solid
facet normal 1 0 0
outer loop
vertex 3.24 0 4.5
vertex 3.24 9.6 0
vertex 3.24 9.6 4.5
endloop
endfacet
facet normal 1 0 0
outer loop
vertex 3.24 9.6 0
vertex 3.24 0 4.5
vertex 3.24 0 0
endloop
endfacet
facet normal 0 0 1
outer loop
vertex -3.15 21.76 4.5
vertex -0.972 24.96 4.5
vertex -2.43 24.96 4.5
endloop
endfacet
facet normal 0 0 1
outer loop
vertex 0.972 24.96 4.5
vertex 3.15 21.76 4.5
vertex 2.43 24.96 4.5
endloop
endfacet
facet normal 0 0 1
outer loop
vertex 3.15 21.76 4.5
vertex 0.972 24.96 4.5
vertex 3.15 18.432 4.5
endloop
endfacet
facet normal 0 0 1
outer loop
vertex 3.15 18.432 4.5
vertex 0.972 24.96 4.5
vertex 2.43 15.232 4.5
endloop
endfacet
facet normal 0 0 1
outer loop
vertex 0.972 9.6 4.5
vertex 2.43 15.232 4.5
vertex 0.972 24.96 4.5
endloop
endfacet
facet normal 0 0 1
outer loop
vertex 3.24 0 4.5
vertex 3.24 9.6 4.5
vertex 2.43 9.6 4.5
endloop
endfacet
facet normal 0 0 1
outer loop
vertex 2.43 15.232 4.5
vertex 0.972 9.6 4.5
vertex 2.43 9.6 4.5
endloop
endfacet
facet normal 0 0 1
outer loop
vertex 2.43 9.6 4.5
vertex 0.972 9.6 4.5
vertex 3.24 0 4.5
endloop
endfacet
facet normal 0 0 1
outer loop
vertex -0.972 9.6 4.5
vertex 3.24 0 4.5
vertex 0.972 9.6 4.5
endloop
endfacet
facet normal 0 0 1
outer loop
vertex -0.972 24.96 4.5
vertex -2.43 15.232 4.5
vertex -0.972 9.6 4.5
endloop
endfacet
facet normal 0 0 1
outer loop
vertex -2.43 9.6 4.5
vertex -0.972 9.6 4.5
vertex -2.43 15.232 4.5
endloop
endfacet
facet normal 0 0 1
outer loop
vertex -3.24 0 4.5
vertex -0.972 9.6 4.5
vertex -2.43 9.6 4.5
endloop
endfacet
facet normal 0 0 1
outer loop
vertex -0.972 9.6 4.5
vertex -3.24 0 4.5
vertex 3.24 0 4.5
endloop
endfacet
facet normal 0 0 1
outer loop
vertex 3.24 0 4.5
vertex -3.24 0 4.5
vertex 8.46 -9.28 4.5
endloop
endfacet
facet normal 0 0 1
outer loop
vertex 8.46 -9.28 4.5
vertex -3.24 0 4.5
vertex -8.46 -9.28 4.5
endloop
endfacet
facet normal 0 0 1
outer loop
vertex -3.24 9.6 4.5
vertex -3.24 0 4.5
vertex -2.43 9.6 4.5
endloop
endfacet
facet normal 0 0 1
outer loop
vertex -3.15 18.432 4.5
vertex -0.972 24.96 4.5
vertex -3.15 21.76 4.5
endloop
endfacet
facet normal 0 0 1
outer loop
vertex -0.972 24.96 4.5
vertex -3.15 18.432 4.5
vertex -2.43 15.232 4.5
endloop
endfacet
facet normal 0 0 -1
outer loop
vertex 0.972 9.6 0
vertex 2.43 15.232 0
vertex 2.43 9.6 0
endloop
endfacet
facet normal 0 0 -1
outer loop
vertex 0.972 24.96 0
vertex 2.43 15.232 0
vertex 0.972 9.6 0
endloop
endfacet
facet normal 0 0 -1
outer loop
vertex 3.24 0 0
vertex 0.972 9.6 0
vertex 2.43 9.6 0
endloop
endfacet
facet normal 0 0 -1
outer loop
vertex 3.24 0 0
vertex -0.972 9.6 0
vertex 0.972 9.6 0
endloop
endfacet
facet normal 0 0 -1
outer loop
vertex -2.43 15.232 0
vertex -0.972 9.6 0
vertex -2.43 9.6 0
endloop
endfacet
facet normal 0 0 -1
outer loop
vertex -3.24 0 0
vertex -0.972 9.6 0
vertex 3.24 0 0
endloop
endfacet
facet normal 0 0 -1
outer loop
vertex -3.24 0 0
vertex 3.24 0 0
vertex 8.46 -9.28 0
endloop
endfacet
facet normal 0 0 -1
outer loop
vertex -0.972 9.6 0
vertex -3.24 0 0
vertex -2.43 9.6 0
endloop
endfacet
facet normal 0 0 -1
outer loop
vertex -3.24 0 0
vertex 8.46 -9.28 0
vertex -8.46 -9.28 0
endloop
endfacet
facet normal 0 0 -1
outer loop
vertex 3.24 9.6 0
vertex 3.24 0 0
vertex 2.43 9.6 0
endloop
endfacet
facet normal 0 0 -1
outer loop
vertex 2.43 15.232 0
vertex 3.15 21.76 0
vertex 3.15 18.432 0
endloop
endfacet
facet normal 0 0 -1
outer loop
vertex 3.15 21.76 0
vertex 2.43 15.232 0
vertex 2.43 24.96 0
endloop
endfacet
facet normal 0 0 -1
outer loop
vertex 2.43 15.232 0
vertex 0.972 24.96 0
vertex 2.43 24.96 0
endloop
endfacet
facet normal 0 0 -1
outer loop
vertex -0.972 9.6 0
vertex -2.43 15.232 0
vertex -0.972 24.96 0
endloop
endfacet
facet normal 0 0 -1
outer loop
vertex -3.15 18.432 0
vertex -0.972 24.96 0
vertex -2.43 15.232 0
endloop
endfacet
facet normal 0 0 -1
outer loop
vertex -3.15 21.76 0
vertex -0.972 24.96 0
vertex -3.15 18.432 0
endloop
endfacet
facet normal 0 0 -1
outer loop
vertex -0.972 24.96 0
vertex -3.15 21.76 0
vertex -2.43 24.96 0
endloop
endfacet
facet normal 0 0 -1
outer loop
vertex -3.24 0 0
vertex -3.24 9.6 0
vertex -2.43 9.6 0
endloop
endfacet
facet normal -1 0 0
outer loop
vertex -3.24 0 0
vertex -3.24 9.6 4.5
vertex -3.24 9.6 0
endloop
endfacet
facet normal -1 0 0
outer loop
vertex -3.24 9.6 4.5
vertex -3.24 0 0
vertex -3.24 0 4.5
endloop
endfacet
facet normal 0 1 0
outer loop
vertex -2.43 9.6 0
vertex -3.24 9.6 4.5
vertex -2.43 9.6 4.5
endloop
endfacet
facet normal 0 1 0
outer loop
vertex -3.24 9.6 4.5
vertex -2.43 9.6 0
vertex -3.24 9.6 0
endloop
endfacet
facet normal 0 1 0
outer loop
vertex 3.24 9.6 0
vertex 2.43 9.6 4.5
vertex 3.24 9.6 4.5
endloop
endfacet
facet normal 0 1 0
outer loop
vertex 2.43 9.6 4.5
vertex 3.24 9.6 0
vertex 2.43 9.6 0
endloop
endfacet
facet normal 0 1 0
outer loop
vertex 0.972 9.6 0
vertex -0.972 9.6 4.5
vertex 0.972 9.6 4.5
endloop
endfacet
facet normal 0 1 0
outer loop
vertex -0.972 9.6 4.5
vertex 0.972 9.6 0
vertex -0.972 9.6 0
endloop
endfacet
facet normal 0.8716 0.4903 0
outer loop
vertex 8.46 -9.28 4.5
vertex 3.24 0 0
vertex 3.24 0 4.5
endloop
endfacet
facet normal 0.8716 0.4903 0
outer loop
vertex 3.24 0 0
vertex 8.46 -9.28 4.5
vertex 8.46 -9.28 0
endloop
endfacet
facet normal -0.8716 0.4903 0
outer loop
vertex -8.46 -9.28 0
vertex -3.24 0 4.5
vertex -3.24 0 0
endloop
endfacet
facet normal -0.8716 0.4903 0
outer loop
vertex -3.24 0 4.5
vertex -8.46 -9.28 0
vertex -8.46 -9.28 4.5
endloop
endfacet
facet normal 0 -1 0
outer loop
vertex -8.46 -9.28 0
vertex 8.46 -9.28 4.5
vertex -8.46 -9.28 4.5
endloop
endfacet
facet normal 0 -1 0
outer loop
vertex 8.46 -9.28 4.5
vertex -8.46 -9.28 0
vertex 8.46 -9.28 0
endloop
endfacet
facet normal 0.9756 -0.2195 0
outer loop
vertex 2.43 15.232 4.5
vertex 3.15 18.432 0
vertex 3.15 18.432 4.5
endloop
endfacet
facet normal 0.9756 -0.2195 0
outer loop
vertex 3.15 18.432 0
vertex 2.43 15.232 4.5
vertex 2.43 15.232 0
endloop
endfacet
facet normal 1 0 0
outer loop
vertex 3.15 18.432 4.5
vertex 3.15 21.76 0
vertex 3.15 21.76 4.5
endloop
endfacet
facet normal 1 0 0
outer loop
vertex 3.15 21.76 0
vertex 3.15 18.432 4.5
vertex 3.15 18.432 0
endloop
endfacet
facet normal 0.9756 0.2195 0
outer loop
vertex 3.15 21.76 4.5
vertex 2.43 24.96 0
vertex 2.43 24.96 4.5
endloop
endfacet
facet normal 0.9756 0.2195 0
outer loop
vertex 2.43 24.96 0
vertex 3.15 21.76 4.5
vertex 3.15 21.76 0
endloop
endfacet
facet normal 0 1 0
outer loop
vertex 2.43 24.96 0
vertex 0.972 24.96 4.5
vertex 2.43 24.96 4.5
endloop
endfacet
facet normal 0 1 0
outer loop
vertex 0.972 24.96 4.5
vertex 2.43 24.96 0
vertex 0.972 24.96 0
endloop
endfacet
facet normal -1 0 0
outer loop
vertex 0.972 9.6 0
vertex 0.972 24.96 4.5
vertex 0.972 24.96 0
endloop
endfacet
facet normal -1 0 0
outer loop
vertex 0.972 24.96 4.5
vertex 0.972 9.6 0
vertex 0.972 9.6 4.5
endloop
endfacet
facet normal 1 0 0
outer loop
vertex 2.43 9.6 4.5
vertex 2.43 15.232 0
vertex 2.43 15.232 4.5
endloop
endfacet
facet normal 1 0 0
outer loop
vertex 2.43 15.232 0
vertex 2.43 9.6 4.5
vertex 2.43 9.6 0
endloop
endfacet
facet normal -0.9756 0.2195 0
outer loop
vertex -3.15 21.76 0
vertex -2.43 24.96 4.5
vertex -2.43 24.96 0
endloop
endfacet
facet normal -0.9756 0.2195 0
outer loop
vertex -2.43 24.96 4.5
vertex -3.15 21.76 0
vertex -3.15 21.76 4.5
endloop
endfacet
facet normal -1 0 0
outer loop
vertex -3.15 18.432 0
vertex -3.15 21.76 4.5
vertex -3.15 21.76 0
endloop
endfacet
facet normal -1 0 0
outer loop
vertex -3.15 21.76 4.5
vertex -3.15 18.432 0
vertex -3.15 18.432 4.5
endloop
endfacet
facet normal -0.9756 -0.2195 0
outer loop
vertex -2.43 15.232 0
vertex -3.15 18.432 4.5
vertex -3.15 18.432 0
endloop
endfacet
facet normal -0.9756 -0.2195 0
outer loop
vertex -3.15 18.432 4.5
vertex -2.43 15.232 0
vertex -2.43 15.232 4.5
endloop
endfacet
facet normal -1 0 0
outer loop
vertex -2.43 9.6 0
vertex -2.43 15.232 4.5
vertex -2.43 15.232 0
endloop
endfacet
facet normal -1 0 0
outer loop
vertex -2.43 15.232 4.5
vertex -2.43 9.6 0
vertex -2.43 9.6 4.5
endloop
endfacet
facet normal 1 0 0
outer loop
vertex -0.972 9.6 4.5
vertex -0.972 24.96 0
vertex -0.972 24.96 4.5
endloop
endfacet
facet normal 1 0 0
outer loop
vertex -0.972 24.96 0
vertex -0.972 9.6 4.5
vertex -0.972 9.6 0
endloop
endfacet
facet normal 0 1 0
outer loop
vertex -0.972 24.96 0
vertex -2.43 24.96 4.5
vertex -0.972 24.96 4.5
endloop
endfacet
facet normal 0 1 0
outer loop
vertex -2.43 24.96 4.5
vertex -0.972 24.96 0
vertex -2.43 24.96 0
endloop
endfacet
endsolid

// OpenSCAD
$fn = 100;

// standard board thicknesses (mm)
PCB_THICK_06 = 0.6;
PCB_THICK_08 = 0.8;
PCB_THICK_10 = 1.0;
PCB_THICK_12 = 1.2;
PCB_THICK_16 = 1.6;

// standard board hole diameters
PCB_HOLE_30 = 3.0;

HEIGHT = 1.8;

// standard stand-off heights
STANDOFF_4 = 3.0;

// base dimensions
BASE_THICKNESS = 3.0;
BASE_DIAMETER = 12.0;
  
module pcb_support(coord,hole_dia,pcb_thick,standoff_height)
{
  translate(coord)
  {
    standoff(hole_dia,standoff_height);
    translate([standoff_height,0,0]) clip(hole_dia,pcb_thick,standoff_height);
  }
}

module baseWedge(hole_dia,base_thickness)
{
  standoff_side = hole_dia*1.2;              // width of standoff
  //standoff_thickness = hole_dia * .75;     // thickness of standoff bar
    standoff_thickness = HEIGHT;     // thickness of standoff bar
  
  translate([0,-base_thickness,0])
    linear_extrude(height=standoff_thickness)
    {
      polygon
      (
        points=
        [
          [-(standoff_side/2+base_thickness),0],
          [-standoff_side/2,base_thickness],
          [standoff_side/2,base_thickness],
          [standoff_side/2+base_thickness,0]
        ]
      );
    }
}

module standoff(hole_dia,height,base_thickness)
{
  standoff_side = hole_dia*1.2;             // width of standoff
  //standoff_thickness = hole_dia * .75;      // thickness of standoff bar
  standoff_thickness = HEIGHT;      // thickness of standoff bar
  shaft_width = hole_dia * 1.0;       // width of clip part that rests inside of the PCB hole
  slot_length = height/5-2;                   // length of cut slot
  slot_width = shaft_width * 0.4;           // amount of gap in the slot
  base_inset = 0.1;                         // inset of wedge into bottom of base
    
  // standoff
  translate([-standoff_side/2,0,0])
  {
    difference()
    {
      cube([standoff_side,height,standoff_thickness]);
      translate([standoff_side/2-slot_width/2,height-slot_length,0]) cube([slot_width,slot_length,standoff_thickness]);
    }
  }
  
  difference()
  {
    baseWedge(hole_dia,base_thickness);
    translate([-(standoff_side+base_thickness*2)/2,-base_thickness,0]) cube([standoff_side+base_thickness*2,base_inset,standoff_thickness]);
  }
}

//pcb_support([0,0,0],3,PCB_THICK_16,8);
module clip(hole_dia,pcb_thick)
{
clip_length = pcb_thick * 3;        // total length of clip
clip_width = hole_dia * 1.2;        // width of clip at its widest
//clip_thickness = hole_dia * .75;    // thickness of of the entire clip in the Z direction
clip_thickness = HEIGHT;    // thickness of of the entire clip in the Z direction
shaft_length = pcb_thick * 1.1;     // length of clip part that rests inside of the PCB hole
shaft_width = hole_dia * 0.9;       // width of clip part that rests inside of the PCB hole
slot_length = clip_length;      // length of cut slot
slot_width = shaft_width * 0.4;    // amount of gap in the slot
  
clip_lip = 0.4;                      // overhange on one side
clip_chamfer = hole_dia/3;           // side of triangle taken off of clip to produce a chamfer  
  
  translate([-shaft_width/2,0,0])
  linear_extrude(height=clip_thickness)
  {
    polygon 
    (
      points=
      [
        // left clip
        [0,0],
        [0,shaft_length],
        [-clip_lip,shaft_length+clip_chamfer],
        [-clip_lip,clip_length-clip_chamfer],
        [0,clip_length],
        [(shaft_width-slot_width)/2,clip_length],
        [(shaft_width-slot_width)/2,clip_length-slot_length],

        // right clip
        [(shaft_width-slot_width)/2+slot_width,clip_length-slot_length],
        [(shaft_width-slot_width)/2+slot_width,clip_length],
        [shaft_width,clip_length],
        [shaft_width+clip_lip,clip_length-clip_chamfer],
        [shaft_width+clip_lip,shaft_length+clip_chamfer],
        [shaft_width,shaft_length],
        [shaft_width,0]
      ]
    );
  }
}

scale([1.8,3.2,2.5])
{
translate([0,STANDOFF_4,0]) clip(PCB_HOLE_30,PCB_THICK_16);
standoff(PCB_HOLE_30,STANDOFF_4,BASE_THICKNESS);
}
